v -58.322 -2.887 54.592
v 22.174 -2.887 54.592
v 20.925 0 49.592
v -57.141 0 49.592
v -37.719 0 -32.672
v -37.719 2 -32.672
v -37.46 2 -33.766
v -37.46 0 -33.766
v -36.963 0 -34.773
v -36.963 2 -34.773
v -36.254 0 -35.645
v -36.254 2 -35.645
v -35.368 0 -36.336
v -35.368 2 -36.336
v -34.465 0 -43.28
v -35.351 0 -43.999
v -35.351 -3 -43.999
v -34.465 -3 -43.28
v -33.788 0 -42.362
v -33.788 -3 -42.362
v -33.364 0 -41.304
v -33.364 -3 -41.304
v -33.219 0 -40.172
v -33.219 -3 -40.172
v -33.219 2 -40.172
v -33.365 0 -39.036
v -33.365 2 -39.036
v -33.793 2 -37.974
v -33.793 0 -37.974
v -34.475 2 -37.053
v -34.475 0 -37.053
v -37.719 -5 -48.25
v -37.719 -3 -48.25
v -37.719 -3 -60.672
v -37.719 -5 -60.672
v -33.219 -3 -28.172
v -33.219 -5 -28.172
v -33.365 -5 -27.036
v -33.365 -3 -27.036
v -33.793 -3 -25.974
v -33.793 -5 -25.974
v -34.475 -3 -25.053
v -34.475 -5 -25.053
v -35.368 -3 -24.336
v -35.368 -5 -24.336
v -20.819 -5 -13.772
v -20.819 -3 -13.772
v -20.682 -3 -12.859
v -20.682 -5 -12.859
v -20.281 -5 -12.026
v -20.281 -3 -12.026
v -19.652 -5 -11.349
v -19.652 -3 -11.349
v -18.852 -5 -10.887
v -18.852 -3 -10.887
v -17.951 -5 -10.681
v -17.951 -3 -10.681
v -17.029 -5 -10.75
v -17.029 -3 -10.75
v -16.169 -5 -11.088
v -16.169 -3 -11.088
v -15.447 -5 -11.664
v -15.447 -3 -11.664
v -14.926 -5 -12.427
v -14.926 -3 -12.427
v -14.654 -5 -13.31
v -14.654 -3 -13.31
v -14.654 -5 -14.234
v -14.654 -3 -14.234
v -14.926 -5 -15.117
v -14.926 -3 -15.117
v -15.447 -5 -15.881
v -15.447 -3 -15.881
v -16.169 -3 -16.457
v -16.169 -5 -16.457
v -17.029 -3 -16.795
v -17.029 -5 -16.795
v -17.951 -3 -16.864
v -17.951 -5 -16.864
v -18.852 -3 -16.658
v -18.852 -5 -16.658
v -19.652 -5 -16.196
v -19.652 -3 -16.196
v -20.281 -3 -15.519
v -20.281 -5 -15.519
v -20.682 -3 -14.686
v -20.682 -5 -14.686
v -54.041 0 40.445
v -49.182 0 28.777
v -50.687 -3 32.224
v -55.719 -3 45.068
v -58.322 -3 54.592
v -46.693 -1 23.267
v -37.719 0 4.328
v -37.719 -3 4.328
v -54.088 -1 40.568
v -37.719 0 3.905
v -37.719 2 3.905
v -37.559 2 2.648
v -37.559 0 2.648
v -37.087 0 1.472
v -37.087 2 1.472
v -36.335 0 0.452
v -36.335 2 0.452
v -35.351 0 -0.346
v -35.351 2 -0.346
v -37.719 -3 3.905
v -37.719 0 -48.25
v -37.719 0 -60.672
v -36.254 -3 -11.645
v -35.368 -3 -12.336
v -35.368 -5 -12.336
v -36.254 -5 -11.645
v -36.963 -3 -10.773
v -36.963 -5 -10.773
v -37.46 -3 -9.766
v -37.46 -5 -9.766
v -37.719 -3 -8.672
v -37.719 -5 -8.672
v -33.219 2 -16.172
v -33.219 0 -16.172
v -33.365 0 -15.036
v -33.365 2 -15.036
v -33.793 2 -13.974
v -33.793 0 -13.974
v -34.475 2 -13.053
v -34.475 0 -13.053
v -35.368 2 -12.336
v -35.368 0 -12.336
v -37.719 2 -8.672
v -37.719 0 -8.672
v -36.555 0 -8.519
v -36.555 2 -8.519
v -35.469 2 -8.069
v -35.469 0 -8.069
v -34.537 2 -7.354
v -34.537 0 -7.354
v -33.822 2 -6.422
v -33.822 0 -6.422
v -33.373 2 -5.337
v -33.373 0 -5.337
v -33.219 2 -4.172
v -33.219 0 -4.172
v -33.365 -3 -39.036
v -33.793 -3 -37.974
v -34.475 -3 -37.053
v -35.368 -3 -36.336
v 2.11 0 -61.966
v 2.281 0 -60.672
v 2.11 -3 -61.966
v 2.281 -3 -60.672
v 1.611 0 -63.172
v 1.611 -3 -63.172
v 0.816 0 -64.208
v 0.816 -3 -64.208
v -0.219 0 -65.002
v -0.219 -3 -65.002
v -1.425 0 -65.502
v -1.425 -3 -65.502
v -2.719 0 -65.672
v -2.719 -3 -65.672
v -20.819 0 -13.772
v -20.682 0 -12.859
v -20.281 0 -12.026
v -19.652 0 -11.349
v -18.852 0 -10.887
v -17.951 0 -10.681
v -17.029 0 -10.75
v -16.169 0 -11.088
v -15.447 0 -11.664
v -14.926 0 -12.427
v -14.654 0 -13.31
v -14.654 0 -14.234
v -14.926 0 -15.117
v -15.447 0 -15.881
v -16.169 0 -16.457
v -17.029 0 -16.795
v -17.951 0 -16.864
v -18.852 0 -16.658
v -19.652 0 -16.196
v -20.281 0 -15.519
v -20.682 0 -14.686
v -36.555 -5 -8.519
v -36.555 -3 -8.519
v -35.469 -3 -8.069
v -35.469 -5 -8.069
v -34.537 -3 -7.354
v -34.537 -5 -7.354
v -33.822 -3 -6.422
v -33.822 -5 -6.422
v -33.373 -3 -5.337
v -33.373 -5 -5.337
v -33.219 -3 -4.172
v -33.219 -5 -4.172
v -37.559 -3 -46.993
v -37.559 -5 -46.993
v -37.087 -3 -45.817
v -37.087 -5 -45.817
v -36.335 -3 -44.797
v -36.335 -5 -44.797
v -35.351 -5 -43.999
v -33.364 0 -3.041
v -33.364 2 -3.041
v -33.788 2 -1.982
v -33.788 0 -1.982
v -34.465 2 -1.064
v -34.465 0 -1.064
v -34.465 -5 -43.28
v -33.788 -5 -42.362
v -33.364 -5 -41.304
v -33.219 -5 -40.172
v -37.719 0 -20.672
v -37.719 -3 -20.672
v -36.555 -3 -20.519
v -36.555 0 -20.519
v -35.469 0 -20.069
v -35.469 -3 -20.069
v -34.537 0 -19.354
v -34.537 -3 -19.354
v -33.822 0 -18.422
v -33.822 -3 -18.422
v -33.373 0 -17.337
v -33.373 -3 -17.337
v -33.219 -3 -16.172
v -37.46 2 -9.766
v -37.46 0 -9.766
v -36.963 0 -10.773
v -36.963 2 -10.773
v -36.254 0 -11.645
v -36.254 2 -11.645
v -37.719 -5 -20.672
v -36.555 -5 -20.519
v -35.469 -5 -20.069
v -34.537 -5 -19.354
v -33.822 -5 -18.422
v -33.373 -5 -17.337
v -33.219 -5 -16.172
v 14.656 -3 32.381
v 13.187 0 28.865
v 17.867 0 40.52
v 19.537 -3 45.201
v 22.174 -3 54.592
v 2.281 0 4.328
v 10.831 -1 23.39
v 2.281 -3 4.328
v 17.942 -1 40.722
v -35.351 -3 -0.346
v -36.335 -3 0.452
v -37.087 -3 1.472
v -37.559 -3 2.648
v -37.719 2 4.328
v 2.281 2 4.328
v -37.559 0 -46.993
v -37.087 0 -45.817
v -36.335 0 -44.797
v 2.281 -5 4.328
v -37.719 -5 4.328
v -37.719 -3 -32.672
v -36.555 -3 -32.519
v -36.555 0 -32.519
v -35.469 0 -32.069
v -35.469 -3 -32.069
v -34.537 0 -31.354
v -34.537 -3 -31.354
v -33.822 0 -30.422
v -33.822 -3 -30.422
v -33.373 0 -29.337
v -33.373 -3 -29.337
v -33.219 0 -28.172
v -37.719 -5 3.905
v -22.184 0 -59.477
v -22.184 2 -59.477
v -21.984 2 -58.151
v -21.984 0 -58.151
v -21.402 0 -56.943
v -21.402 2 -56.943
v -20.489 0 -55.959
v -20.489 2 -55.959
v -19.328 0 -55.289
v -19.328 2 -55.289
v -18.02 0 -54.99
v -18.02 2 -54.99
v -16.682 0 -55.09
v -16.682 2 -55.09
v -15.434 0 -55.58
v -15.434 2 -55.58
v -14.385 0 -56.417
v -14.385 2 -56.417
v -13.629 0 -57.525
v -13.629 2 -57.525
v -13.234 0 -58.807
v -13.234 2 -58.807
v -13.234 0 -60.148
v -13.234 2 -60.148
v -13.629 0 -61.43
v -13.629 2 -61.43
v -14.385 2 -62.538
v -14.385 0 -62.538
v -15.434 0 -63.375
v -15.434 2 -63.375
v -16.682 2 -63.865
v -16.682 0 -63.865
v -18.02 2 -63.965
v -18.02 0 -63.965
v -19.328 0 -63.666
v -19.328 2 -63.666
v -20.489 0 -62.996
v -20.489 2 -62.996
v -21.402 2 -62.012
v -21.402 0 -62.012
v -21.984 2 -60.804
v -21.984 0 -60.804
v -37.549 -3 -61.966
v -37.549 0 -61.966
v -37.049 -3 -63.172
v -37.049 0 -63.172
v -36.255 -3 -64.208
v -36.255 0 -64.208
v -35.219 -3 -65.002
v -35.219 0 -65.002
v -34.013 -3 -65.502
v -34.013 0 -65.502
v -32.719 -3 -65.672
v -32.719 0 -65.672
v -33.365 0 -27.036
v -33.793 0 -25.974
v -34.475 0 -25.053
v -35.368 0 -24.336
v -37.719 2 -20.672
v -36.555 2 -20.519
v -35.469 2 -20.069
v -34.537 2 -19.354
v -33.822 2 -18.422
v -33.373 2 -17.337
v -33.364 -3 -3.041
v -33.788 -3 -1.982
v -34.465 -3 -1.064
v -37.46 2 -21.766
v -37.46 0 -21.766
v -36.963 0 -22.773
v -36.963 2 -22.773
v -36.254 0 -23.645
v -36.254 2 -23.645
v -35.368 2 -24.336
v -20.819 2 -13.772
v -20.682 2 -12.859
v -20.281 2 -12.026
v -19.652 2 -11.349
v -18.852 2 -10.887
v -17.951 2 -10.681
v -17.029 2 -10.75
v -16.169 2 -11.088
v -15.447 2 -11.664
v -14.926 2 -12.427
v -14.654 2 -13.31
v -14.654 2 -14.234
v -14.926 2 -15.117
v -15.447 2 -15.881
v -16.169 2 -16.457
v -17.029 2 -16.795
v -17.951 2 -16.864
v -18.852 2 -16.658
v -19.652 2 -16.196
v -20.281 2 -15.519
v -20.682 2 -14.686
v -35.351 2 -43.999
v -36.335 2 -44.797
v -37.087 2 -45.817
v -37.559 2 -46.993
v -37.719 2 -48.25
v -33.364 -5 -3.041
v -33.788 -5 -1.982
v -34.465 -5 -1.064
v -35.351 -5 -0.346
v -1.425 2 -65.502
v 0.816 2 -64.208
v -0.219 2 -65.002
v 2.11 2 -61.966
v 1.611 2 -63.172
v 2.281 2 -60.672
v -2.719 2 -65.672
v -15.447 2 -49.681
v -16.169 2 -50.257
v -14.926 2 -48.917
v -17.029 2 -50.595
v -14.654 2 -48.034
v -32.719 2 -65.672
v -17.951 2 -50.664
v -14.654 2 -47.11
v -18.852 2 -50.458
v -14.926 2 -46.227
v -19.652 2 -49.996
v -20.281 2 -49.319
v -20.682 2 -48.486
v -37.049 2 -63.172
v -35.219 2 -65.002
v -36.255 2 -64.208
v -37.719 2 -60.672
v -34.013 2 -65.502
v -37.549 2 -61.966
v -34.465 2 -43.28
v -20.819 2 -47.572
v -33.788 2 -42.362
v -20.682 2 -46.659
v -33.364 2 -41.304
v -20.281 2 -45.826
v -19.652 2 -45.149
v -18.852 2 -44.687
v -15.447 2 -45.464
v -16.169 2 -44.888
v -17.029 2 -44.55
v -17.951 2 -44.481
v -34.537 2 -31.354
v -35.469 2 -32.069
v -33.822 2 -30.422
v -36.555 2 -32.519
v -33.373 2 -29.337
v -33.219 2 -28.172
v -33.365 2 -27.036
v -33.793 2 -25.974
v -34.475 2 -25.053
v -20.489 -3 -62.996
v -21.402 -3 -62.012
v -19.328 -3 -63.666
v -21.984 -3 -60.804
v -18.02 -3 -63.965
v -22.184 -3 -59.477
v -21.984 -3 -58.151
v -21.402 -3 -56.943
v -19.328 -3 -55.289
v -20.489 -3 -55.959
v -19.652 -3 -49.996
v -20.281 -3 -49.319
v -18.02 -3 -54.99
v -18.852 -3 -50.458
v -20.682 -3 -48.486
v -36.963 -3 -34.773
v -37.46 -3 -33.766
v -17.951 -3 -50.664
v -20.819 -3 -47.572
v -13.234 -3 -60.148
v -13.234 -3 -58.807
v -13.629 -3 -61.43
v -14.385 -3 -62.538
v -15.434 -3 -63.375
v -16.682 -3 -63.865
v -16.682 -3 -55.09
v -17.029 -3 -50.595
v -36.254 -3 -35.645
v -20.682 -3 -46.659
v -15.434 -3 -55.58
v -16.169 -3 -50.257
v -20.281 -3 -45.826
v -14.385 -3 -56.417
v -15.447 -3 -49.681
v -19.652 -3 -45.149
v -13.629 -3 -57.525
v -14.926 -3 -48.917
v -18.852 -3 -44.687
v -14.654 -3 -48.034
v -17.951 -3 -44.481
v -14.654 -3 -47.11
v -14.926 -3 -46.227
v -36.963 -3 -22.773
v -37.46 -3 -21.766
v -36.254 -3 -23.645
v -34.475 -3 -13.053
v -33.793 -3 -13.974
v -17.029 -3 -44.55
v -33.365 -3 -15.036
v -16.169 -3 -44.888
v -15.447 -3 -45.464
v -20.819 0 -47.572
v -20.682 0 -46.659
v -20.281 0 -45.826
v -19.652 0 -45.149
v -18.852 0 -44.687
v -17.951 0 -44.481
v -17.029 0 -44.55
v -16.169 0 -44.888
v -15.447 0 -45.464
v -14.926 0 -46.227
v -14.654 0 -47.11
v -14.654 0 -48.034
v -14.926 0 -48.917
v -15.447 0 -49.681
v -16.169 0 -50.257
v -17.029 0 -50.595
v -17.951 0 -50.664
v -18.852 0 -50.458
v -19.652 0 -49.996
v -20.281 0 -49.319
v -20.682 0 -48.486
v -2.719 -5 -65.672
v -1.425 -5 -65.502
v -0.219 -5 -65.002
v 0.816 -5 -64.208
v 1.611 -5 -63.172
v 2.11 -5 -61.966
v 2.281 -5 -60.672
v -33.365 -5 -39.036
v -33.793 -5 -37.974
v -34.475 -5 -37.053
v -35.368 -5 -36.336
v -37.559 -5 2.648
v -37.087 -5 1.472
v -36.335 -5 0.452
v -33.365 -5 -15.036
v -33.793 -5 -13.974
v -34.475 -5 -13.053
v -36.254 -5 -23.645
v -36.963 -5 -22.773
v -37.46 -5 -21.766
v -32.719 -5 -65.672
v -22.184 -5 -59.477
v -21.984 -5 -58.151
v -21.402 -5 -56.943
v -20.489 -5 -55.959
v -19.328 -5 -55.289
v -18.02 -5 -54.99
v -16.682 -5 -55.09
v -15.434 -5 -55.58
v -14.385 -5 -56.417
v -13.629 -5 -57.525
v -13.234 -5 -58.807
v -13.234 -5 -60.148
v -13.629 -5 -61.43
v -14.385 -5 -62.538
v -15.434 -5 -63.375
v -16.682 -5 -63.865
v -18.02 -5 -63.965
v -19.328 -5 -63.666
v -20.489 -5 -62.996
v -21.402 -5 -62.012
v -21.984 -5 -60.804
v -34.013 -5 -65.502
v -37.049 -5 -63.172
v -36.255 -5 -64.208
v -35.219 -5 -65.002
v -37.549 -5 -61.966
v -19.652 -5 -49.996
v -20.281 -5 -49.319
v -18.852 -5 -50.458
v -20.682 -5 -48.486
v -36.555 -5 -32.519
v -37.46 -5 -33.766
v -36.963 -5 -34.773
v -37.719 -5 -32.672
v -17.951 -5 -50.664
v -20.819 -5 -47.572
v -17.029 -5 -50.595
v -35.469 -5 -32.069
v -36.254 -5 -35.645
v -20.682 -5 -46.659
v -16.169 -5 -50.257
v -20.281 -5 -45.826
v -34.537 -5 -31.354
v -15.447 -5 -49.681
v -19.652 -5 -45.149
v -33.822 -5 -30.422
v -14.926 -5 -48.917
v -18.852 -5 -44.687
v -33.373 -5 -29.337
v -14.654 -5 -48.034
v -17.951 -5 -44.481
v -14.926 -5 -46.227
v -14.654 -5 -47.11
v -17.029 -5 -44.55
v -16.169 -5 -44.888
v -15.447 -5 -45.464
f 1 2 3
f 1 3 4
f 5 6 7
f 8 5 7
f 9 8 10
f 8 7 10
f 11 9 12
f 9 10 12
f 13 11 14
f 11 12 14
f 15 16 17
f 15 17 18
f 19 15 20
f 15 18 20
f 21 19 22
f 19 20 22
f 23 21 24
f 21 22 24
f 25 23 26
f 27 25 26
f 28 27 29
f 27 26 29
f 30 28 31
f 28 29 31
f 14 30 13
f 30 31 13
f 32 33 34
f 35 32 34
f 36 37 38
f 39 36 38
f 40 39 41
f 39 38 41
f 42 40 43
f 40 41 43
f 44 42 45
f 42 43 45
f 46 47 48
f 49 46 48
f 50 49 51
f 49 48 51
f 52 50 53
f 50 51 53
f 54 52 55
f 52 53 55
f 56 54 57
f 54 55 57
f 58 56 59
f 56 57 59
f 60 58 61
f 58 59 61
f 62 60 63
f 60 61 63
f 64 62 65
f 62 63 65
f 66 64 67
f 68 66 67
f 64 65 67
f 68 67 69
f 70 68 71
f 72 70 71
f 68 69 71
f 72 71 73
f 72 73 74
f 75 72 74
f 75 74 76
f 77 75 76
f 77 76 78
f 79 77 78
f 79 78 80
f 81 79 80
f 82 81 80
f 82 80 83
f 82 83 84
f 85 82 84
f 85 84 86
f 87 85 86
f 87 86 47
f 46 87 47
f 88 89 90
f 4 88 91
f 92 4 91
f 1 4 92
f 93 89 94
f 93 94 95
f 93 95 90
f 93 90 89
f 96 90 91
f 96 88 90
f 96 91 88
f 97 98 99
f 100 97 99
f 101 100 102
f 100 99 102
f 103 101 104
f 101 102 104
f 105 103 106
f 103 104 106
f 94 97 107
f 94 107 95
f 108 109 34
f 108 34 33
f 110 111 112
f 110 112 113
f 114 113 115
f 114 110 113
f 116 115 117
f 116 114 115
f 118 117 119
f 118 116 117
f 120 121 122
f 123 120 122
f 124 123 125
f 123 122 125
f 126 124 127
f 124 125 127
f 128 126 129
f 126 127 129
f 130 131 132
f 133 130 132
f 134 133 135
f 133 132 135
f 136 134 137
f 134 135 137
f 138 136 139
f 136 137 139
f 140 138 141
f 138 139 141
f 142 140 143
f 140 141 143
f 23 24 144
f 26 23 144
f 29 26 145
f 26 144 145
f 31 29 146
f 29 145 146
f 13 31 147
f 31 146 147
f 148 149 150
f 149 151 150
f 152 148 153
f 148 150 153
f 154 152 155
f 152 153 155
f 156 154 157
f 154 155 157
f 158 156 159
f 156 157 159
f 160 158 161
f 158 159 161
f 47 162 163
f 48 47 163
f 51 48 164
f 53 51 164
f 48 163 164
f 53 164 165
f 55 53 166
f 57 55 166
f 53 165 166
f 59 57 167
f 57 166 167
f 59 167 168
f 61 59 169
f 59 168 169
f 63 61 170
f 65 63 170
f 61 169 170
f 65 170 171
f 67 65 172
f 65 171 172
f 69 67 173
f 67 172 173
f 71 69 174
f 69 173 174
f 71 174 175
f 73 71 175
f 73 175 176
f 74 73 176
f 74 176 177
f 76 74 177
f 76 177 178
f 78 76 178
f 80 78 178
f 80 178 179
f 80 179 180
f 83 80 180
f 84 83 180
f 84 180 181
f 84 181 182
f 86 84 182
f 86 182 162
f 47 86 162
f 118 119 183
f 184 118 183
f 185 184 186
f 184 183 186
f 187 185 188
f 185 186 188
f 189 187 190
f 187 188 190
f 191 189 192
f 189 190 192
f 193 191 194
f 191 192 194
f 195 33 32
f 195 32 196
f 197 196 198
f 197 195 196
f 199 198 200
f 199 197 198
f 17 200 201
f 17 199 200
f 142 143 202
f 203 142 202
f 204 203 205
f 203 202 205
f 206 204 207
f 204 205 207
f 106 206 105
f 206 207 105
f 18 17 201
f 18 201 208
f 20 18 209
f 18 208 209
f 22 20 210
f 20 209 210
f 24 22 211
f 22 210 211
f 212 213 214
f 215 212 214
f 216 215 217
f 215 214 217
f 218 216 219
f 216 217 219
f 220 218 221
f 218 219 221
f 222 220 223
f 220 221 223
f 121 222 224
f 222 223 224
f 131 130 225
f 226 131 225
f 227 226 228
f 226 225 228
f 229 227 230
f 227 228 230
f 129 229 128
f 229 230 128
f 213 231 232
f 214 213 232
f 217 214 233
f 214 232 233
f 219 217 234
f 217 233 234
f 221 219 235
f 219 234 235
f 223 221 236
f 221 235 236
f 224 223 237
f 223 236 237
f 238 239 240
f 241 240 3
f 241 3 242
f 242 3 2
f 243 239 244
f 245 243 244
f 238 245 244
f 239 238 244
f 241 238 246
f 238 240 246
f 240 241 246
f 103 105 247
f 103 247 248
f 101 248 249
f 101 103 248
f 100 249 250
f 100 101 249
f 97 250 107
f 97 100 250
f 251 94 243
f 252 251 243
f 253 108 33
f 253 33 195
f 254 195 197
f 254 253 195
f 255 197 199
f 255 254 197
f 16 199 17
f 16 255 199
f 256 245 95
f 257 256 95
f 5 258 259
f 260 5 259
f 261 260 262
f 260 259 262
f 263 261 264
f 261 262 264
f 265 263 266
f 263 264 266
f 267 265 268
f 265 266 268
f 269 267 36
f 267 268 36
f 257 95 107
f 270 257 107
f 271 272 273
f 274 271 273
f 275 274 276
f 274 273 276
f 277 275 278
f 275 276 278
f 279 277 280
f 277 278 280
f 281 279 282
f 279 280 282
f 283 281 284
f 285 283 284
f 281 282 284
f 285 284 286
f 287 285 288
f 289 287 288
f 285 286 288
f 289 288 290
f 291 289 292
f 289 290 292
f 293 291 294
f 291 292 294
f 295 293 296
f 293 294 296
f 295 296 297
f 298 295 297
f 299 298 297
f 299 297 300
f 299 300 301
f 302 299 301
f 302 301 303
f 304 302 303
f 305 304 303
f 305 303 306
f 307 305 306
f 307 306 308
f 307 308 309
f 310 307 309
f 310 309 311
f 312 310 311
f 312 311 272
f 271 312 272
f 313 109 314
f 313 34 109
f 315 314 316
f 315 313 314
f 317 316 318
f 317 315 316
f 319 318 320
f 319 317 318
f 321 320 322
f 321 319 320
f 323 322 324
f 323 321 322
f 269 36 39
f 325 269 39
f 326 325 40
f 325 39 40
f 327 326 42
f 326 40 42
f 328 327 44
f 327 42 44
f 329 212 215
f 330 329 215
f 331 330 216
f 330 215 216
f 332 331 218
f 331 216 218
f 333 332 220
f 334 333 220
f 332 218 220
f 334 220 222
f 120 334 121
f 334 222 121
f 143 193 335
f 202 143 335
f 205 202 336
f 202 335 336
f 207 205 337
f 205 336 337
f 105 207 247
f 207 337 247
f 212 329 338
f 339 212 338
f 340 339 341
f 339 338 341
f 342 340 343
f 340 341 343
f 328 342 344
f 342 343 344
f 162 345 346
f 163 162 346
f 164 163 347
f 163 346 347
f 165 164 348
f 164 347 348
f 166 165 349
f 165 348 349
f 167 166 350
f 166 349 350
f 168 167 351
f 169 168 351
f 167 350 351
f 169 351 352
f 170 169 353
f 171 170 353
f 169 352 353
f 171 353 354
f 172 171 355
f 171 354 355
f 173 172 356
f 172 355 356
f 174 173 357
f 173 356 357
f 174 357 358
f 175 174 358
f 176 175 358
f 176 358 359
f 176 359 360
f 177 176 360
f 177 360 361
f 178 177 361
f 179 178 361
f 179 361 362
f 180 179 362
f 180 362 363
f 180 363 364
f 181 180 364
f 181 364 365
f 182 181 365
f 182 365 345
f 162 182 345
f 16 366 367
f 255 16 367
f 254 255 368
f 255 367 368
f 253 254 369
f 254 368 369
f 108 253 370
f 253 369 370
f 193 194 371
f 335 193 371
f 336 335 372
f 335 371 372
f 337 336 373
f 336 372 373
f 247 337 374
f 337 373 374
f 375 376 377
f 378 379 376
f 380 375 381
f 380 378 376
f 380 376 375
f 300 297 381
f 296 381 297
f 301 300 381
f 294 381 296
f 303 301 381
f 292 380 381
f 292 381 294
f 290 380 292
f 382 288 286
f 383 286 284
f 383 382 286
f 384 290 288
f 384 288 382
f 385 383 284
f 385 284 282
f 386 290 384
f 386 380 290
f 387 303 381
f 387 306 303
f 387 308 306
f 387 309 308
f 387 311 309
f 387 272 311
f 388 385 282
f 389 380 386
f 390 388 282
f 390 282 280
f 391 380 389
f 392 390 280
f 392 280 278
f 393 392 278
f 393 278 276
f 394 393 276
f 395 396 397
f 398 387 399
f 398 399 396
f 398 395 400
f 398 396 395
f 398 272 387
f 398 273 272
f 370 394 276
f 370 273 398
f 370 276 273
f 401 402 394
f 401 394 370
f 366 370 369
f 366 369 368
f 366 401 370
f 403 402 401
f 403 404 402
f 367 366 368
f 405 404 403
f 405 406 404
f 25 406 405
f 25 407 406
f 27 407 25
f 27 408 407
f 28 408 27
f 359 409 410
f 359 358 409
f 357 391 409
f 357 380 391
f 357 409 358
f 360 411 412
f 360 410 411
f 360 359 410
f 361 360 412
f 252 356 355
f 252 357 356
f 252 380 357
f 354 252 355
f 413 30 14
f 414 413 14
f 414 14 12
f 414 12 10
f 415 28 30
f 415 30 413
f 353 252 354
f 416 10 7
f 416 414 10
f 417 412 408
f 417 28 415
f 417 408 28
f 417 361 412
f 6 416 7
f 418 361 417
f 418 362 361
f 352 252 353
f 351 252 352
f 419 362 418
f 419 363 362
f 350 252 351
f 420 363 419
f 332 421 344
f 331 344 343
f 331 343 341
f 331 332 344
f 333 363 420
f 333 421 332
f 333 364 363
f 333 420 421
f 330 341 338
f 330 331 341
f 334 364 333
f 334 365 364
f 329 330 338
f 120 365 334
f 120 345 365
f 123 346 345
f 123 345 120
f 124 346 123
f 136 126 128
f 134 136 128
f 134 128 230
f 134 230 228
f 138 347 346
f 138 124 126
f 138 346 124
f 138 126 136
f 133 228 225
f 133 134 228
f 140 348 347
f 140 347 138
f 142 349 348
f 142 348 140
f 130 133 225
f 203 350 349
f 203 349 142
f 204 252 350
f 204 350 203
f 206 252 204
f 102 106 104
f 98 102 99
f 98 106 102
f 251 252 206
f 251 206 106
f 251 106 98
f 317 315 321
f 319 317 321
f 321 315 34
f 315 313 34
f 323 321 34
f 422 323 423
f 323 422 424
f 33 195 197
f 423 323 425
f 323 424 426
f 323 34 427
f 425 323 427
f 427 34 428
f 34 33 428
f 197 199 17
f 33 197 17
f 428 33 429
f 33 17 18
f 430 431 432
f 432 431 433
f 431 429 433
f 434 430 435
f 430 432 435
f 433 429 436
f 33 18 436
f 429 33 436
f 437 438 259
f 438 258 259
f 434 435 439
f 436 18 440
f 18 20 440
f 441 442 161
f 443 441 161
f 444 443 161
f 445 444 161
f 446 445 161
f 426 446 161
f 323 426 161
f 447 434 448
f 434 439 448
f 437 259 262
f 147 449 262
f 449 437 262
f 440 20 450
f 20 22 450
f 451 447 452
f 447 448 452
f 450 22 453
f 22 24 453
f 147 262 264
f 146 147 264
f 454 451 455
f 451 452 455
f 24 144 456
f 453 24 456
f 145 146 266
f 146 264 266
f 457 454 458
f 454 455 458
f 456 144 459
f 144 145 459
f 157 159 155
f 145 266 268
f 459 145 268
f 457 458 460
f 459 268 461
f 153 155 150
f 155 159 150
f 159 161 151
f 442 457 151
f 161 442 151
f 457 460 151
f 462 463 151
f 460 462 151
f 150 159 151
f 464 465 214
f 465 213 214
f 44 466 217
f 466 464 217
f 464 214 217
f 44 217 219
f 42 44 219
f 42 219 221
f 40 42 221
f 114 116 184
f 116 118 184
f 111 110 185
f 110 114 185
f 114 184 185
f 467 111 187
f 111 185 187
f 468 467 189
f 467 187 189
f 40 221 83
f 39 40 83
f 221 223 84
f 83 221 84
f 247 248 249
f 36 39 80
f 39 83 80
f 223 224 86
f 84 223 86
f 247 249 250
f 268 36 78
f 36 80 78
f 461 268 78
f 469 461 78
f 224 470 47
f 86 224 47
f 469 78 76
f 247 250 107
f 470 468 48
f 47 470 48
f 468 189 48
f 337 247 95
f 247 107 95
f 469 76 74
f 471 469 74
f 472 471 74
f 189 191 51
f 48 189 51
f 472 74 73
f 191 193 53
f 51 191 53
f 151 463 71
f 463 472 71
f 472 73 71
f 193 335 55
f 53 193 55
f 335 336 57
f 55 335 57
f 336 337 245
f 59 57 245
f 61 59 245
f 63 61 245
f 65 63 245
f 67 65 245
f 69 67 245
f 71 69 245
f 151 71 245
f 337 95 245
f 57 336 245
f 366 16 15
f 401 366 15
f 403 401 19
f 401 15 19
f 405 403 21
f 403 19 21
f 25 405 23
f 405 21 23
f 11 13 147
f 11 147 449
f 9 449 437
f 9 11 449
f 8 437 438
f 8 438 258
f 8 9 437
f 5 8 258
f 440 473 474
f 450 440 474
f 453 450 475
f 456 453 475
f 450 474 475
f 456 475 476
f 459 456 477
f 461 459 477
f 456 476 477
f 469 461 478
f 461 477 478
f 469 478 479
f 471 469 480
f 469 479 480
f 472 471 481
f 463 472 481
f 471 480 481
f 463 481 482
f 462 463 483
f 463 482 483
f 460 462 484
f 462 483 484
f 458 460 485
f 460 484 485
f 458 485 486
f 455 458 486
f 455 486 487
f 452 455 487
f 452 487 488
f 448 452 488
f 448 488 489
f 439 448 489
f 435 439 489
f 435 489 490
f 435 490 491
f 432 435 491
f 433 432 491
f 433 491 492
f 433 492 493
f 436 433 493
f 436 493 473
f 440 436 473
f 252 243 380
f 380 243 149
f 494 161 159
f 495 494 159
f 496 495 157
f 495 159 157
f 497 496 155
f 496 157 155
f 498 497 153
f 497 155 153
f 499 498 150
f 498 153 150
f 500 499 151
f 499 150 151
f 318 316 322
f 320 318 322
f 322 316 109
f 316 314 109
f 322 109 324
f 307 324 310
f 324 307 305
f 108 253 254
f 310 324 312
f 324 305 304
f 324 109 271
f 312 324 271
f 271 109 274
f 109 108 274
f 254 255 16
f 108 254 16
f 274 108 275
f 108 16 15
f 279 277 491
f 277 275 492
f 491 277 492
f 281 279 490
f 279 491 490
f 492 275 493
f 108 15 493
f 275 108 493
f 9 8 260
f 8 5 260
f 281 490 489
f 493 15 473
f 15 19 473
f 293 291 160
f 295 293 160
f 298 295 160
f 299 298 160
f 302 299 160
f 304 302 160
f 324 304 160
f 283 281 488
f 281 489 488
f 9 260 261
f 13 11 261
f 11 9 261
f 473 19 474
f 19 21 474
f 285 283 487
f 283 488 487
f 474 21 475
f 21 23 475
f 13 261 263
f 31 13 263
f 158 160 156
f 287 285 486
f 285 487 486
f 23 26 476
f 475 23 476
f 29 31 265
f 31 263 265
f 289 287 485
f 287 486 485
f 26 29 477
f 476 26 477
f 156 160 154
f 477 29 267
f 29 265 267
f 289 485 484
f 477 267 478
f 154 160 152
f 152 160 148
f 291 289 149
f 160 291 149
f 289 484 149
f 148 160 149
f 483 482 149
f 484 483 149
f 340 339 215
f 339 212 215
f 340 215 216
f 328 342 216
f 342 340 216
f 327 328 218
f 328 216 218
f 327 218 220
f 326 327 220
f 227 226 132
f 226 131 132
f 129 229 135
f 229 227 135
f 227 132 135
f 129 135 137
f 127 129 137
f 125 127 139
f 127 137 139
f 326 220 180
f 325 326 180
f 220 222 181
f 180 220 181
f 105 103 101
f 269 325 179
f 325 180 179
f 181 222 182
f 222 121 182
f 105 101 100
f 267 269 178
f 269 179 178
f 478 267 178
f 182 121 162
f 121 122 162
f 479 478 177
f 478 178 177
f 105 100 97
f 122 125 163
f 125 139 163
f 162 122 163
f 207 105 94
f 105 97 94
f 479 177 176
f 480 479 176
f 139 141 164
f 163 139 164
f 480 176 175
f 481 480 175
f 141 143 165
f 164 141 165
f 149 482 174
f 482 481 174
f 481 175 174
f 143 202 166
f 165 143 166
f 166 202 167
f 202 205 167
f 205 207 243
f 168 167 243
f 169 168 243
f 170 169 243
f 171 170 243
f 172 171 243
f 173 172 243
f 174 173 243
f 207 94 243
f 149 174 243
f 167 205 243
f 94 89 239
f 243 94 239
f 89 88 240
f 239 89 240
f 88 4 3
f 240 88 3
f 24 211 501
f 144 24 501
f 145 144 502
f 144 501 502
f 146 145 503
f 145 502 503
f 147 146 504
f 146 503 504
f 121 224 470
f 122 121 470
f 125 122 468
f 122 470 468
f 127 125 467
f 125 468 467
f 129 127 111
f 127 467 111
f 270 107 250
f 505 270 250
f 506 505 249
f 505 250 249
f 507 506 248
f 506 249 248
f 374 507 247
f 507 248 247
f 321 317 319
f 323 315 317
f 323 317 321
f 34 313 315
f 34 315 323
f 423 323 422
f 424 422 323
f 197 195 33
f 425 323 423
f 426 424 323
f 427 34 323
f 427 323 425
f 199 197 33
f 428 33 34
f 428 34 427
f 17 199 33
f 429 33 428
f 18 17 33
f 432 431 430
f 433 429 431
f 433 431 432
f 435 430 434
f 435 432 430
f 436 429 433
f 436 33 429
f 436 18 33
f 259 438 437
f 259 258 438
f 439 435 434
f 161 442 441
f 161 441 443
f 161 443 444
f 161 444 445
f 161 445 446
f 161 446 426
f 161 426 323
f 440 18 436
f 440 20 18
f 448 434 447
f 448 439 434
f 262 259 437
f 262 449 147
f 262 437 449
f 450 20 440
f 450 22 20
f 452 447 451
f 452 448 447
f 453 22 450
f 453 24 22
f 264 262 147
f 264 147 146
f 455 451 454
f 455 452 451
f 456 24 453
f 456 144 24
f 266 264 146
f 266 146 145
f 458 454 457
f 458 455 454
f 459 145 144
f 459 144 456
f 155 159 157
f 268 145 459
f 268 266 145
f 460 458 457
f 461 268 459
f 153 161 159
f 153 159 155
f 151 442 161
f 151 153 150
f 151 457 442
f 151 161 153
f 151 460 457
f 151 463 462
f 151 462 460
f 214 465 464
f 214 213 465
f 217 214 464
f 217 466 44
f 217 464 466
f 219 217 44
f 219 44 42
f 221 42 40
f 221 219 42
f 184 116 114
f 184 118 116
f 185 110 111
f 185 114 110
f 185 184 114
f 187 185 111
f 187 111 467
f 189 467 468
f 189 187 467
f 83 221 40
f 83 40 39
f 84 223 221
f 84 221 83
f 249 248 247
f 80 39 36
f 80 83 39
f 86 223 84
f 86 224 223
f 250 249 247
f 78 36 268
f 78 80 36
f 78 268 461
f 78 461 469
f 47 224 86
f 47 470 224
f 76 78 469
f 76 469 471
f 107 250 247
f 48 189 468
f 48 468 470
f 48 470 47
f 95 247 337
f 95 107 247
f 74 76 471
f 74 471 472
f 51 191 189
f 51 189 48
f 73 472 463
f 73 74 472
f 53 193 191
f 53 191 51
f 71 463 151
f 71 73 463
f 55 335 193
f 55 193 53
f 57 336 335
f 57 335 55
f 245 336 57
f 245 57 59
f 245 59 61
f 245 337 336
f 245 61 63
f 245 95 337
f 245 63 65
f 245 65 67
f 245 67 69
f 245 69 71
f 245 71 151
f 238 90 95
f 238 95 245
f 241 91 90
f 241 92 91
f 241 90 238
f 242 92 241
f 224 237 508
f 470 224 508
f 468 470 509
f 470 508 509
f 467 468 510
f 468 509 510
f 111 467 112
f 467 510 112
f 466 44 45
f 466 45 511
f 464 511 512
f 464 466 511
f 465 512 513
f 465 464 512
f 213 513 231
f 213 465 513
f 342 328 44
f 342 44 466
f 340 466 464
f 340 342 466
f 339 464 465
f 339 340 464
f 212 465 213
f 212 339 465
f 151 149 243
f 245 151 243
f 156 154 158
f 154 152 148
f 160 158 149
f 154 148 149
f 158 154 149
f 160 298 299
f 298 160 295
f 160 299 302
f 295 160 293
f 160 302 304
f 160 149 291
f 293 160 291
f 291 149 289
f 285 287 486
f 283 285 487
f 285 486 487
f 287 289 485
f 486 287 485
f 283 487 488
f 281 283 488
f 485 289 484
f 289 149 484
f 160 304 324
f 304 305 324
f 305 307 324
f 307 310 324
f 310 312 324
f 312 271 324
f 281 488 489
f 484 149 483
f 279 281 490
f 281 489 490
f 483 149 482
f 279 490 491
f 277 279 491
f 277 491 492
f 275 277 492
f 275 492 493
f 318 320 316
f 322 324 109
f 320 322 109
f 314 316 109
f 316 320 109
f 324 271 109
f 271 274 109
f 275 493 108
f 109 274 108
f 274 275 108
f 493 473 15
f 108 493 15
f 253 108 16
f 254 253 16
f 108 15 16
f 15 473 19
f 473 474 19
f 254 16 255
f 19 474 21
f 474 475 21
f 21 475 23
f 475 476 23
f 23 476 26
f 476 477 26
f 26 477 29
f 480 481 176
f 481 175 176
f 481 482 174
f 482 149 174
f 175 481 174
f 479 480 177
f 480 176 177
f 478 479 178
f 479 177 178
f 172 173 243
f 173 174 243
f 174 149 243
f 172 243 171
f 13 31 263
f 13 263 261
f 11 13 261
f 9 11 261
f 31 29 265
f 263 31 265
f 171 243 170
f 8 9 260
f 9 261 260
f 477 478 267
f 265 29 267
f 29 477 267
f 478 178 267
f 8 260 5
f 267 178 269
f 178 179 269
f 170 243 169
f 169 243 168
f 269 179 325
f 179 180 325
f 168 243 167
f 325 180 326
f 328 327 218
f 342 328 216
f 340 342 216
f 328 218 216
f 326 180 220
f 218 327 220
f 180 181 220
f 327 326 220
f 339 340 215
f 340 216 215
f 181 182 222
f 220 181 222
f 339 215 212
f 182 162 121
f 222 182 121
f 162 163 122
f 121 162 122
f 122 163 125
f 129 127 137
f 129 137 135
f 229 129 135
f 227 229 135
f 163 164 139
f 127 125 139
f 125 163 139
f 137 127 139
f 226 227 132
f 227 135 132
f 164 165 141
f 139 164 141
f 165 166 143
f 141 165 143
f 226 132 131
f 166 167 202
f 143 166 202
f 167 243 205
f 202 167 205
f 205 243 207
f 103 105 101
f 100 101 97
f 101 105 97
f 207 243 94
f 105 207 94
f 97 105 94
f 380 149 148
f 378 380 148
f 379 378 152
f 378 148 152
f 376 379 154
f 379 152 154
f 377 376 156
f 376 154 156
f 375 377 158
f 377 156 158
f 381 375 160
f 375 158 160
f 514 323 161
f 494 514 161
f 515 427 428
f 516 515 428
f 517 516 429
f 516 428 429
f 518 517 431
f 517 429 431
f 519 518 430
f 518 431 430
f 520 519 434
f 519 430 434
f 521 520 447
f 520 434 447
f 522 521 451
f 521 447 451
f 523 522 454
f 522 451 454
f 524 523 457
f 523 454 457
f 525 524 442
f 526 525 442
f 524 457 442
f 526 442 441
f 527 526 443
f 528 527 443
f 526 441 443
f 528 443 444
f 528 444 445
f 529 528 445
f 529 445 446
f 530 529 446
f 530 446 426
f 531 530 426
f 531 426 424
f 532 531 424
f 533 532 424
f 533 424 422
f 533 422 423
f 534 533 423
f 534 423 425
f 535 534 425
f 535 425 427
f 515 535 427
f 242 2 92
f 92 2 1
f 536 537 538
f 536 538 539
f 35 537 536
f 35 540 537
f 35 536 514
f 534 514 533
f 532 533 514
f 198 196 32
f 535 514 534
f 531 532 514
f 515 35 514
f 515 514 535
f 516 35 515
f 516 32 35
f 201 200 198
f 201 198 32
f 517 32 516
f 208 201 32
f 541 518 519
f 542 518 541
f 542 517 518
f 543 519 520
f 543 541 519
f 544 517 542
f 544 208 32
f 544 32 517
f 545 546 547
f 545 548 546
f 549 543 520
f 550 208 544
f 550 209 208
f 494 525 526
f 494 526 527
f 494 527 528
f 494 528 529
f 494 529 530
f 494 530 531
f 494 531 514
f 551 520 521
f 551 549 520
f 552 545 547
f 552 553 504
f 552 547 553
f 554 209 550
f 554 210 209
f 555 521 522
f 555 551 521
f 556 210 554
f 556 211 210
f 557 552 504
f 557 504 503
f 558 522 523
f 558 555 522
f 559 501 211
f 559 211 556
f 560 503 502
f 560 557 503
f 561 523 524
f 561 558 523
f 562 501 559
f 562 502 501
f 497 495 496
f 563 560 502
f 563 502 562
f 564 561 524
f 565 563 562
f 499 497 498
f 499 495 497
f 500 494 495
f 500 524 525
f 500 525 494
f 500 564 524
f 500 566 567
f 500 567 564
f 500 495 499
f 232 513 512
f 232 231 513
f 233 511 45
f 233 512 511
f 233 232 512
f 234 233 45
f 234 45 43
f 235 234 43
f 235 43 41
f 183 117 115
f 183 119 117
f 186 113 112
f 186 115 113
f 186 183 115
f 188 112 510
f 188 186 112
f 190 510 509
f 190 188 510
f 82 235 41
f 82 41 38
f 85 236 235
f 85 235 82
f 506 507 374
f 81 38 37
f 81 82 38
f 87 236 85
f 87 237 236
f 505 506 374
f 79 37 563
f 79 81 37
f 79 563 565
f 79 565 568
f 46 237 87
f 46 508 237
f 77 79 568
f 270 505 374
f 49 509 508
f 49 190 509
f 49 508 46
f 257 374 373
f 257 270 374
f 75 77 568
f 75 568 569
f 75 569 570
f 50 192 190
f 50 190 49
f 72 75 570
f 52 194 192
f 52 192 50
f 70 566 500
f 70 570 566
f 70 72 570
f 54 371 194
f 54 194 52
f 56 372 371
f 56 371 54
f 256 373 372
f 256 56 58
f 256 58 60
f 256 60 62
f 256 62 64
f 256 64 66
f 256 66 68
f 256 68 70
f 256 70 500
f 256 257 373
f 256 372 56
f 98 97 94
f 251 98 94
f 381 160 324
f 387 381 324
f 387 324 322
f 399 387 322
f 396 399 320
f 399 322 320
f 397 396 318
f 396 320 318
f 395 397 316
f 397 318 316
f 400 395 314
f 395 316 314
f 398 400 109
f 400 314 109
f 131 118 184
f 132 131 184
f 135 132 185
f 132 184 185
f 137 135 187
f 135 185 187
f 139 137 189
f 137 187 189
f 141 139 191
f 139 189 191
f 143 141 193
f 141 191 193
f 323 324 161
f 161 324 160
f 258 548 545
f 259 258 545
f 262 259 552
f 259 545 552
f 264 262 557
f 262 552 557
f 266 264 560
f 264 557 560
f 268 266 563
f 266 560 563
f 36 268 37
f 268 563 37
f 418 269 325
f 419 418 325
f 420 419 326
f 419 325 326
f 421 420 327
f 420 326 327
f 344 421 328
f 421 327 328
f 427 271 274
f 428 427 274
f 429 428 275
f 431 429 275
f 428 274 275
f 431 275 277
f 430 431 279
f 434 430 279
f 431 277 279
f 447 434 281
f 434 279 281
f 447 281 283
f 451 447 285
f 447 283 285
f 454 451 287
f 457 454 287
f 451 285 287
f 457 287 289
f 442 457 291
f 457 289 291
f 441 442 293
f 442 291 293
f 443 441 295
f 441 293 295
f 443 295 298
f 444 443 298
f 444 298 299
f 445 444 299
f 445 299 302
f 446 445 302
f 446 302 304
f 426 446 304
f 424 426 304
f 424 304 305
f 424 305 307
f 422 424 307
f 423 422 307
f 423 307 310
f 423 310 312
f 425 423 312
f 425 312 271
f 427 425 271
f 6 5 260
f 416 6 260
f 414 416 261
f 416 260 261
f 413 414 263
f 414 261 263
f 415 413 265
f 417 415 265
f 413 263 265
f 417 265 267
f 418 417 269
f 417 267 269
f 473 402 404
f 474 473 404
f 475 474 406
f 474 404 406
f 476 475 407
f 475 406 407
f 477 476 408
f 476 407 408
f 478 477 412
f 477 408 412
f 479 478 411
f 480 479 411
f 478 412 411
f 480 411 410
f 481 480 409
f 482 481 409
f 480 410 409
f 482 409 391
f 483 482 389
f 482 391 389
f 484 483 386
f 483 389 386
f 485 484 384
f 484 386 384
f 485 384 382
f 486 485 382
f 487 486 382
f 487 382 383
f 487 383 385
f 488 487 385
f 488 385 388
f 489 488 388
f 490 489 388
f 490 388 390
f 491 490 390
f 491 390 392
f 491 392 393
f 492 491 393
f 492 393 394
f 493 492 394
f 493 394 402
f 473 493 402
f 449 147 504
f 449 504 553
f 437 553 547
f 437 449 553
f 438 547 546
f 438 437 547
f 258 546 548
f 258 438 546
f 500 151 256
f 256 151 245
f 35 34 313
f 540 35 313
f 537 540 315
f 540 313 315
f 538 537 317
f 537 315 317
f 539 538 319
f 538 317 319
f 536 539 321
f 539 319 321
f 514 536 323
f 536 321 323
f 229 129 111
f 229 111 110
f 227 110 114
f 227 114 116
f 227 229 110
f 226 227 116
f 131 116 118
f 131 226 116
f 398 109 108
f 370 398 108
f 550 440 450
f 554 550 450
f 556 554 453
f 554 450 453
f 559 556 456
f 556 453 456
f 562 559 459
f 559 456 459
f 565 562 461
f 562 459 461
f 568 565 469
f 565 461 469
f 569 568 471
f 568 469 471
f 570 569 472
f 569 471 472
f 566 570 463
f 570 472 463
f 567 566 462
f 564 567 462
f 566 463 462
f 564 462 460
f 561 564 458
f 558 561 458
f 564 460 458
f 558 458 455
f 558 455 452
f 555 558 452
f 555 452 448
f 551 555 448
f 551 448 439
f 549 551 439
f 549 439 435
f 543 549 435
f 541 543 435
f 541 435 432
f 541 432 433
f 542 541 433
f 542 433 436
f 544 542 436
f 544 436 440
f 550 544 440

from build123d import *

# Parameters (mm, degrees)
F0_W           = 40
F0_H           = 70
F1_DEPTH       = 3
F2_SIZE2       = 2.8867513459
F2_SIZE        = 5
F3_R           = 5
F5_DEPTH       = 2
F7_DEPTH       = 2
F9_DEPTH       = 25
F10_T1_DEPTH   = 20.8887360535
F10_T3_DEPTH   = 18
F10_2_T1_DEPTH = 19.8887360535
F10_2_T3_DEPTH = 17
F10_3_T1_DEPTH = 19.8887360535
F10_3_T3_DEPTH = 17
F11_R          = 3.1
F12_DEPTH      = 25
F13_R          = 4.5
F14_DEPTH      = 25


# Not quite as in the source:
# - a fillet or chamfer that OpenCascade refuses, or shapes differently, is made with other operations: its cross-section is extruded or revolved along the edge and cut away or added


with BuildPart() as f1:
    # F0 (on Front) → F1 (new body)
    with BuildSketch(Plane.XZ):
        with Locations((-17.71930933, -30.67235291)):
            Rectangle(F0_W, F0_H)
        with BuildLine():
            add(Edge.make_bspline(
                [(-37.71930933, 4.32764709), (-46.9567519014, 23.5397209268), (-56.1941944728, 42.7517947636), (-58.3224408329, 54.5924380422)],
                knots=[0, 0, 0, 0, 0.660266098, 0.660266098, 0.660266098, 0.660266098], degree=3))
            Line((-37.71930933, 4.32764709), (2.28069067, 4.32764709))
            add(Edge.make_bspline(
                [(2.28069067, 4.32764709), (11.0710881678, 23.6786254545), (19.8614856657, 43.029603819), (22.1735145897, 54.5924380422)],
                knots=[0, 0, 0, 0, 0.6674614582, 0.6674614582, 0.6674614582, 0.6674614582], degree=3))
            Line((22.1735145897, 54.5924380422), (-58.3224408329, 54.5924380422))
        make_face()
    extrude(amount=F1_DEPTH)

    # F2
    f2_edges = [f1.edges().sort_by_distance(p)[0] for p in [
        (-18.074463, 0, 54.592438),
    ]]
    f2_side = f1.faces().sort_by_distance((-17.870768, 0, 2.51511))[0]
    chamfer(f2_edges, length=F2_SIZE, length2=F2_SIZE2, reference=f2_side)

    # F3
    f3_edges = [f1.edges().sort_by_distance(p)[0] for p in [
        (2.280691, -1.5, -65.672353),
        (-37.719309, -1.5, -65.672353),
    ]]
    fillet(f3_edges, radius=F3_R)


with BuildPart() as f5:
    # F4 (on face) → F5 (new body)
    with BuildSketch(Plane.XZ.offset(3)):
        with BuildLine():
            Line((2.28069067, 4.32764709), (-37.71930933, 4.32764709))
            Line((-37.71930933, 4.32764709), (-37.71930933, -60.67235291))
            ThreePointArc((-37.71930933, -60.67235291), (-36.2548432359, -64.207886816), (-32.71930933, -65.67235291))
            Line((-32.71930933, -65.67235291), (-2.71930933, -65.67235291))
            ThreePointArc((-2.71930933, -65.67235291), (0.8162245759, -64.207886816), (2.28069067, -60.67235291))
            Line((2.28069067, -60.67235291), (2.28069067, 4.32764709))
        make_face()
    extrude(amount=F5_DEPTH)


with BuildPart() as f7:
    # F6 (on face) → F7 (new body)
    with BuildSketch(Plane(origin=(0, 0, 0), x_dir=(-1, 0, 0), z_dir=(0, 1, 0))):
        with BuildLine():
            Line((37.71930933, 4.32764709), (-2.28069067, 4.32764709))
            Line((-2.28069067, 4.32764709), (-2.28069067, -60.67235291))
            ThreePointArc((-2.28069067, -60.67235291), (-0.8162245759, -64.207886816), (2.71930933, -65.67235291))
            Line((2.71930933, -65.67235291), (32.71930933, -65.67235291))
            ThreePointArc((32.71930933, -65.67235291), (36.2548432359, -64.207886816), (37.71930933, -60.67235291))
            Line((37.71930933, -60.67235291), (37.71930933, 4.32764709))
        make_face()
    extrude(amount=F7_DEPTH)


with BuildPart() as f9_tool:
    # F8 (on face) → F9 (new body)
    with BuildSketch(Plane.XZ.offset(5)):
        with BuildLine():
            ThreePointArc((-37.71930933, -8.67235291), (-34.5373288146, -7.3543334254), (-33.21930933, -4.17235291))
            ThreePointArc((-33.21930933, -4.17235291), (-34.5373288146, -0.9903723947), (-37.71930933, 0.32764709))
            Line((-37.71930933, 0.32764709), (-37.71930933, -8.67235291))
        make_face()
        with BuildLine():
            ThreePointArc((-33.21930933, -16.17235291), (-34.5373288146, -12.9903723947), (-37.71930933, -11.67235291))
            Line((-37.71930933, -11.67235291), (-37.71930933, -20.67235291))
            ThreePointArc((-37.71930933, -20.67235291), (-34.5373288146, -19.3543334254), (-33.21930933, -16.17235291))
        make_face()
        with BuildLine():
            ThreePointArc((-33.21930933, -28.17235291), (-34.5373288146, -24.9903723947), (-37.71930933, -23.67235291))
            Line((-37.71930933, -23.67235291), (-37.71930933, -32.67235291))
            ThreePointArc((-37.71930933, -32.67235291), (-34.5373288146, -31.3543334254), (-33.21930933, -28.17235291))
        make_face()
        with BuildLine():
            ThreePointArc((-33.21930933, -40.17235291), (-34.5373288146, -36.9903723947), (-37.71930933, -35.67235291))
            Line((-37.71930933, -35.67235291), (-37.71930933, -44.67235291))
            ThreePointArc((-37.71930933, -44.67235291), (-34.5373288146, -43.3543334254), (-33.21930933, -40.17235291))
        make_face()
    extrude(amount=-F9_DEPTH)


with BuildPart() as f1_1:
    add(f1.part)

    # F9: cut by f9_tool
    add(f9_tool.part, mode=Mode.SUBTRACT)

    # F10: fillet of radius 5 on 5 edges, made by hand

    # F10_s2 → F10_t1 (cut)
    with BuildSketch(Plane.XZ.offset(-8.9443680268)):
        with BuildLine():
            ThreePointArc((-35.3508882774, -0.3460515997), (-37.0872547702, 1.4720729837), (-37.71930933, 3.9053943007))
            Line((-37.71930933, 3.9053943007), (-37.71930933, 0.32764709))
            ThreePointArc((-37.71930933, 0.32764709), (-36.4881220771, 0.1559467501), (-35.3508882774, -0.3460515997))
        make_face()
        with BuildLine():
            ThreePointArc((-37.71930933, -48.2501001207), (-37.0872547702, -45.8167788038), (-35.3508882774, -43.9986542204))
            ThreePointArc((-35.3508882774, -43.9986542204), (-36.4881220771, -44.5006525702), (-37.71930933, -44.67235291))
            Line((-37.71930933, -44.67235291), (-37.71930933, -48.2501001207))
        make_face()
    extrude(amount=F10_T1_DEPTH, mode=Mode.SUBTRACT)

    # F10_s4 → F10_t3 (cut)
    with BuildSketch(Plane.XZ.offset(-7.5)):
        with BuildLine():
            ThreePointArc((-35.3680027444, -12.3355108048), (-36.9632021222, -10.7732299606), (-37.71930933, -8.67235291))
            Line((-37.71930933, -8.67235291), (-37.71930933, -11.67235291))
            ThreePointArc((-37.71930933, -11.67235291), (-36.4977917234, -11.8413143814), (-35.3680027444, -12.3355108048))
        make_face()
        with BuildLine():
            ThreePointArc((-35.3680027444, -24.3355108048), (-36.9632021222, -22.7732299606), (-37.71930933, -20.67235291))
            Line((-37.71930933, -20.67235291), (-37.71930933, -23.67235291))
            ThreePointArc((-37.71930933, -23.67235291), (-36.4977917234, -23.8413143814), (-35.3680027444, -24.3355108048))
        make_face()
        with BuildLine():
            ThreePointArc((-35.3680027444, -36.3355108048), (-36.9632021222, -34.7732299606), (-37.71930933, -32.67235291))
            Line((-37.71930933, -32.67235291), (-37.71930933, -35.67235291))
            ThreePointArc((-37.71930933, -35.67235291), (-36.4977917234, -35.8413143814), (-35.3680027444, -36.3355108048))
        make_face()
    extrude(amount=F10_T3_DEPTH, mode=Mode.SUBTRACT)


with BuildPart() as f5_1:
    add(f5.part)

    # F9: cut by f9_tool
    add(f9_tool.part, mode=Mode.SUBTRACT)

    # F10#2: fillet of radius 5 on 5 edges, made by hand

    # F10_2_s2 → F10_2_t1 (cut)
    with BuildSketch(Plane.XZ.offset(-5.9443680268)):
        with BuildLine():
            ThreePointArc((-37.71930933, 3.9053943007), (-37.0872547702, 1.4720729837), (-35.3508882774, -0.3460515997))
            ThreePointArc((-35.3508882774, -0.3460515997), (-36.4881220771, 0.1559467501), (-37.71930933, 0.32764709))
            Line((-37.71930933, 0.32764709), (-37.71930933, 3.9053943007))
        make_face()
        with BuildLine():
            ThreePointArc((-37.71930933, -48.2501001207), (-37.0872547702, -45.8167788038), (-35.3508882774, -43.9986542204))
            ThreePointArc((-35.3508882774, -43.9986542204), (-36.4881220771, -44.5006525702), (-37.71930933, -44.67235291))
            Line((-37.71930933, -44.67235291), (-37.71930933, -48.2501001207))
        make_face()
    extrude(amount=F10_2_T1_DEPTH, mode=Mode.SUBTRACT)

    # F10_2_s4 → F10_2_t3 (cut)
    with BuildSketch(Plane.XZ.offset(-4.5)):
        with BuildLine():
            ThreePointArc((-35.3680027444, -12.3355108048), (-36.9632021222, -10.7732299606), (-37.71930933, -8.67235291))
            Line((-37.71930933, -8.67235291), (-37.71930933, -11.67235291))
            ThreePointArc((-37.71930933, -11.67235291), (-36.4977917234, -11.8413143814), (-35.3680027444, -12.3355108048))
        make_face()
        with BuildLine():
            ThreePointArc((-35.3680027444, -24.3355108048), (-36.9632021222, -22.7732299606), (-37.71930933, -20.67235291))
            Line((-37.71930933, -20.67235291), (-37.71930933, -23.67235291))
            ThreePointArc((-37.71930933, -23.67235291), (-36.4977917234, -23.8413143814), (-35.3680027444, -24.3355108048))
        make_face()
        with BuildLine():
            ThreePointArc((-35.3680027444, -36.3355108048), (-36.9632021222, -34.7732299606), (-37.71930933, -32.67235291))
            Line((-37.71930933, -32.67235291), (-37.71930933, -35.67235291))
            ThreePointArc((-37.71930933, -35.67235291), (-36.4977917234, -35.8413143814), (-35.3680027444, -36.3355108048))
        make_face()
    extrude(amount=F10_2_T3_DEPTH, mode=Mode.SUBTRACT)


with BuildPart() as f7_1:
    add(f7.part)

    # F9: cut by f9_tool
    add(f9_tool.part, mode=Mode.SUBTRACT)

    # F10#3: fillet of radius 5 on 5 edges, made by hand

    # F10_3_s2 → F10_3_t1 (cut)
    with BuildSketch(Plane.XZ.offset(-10.9443680268)):
        with BuildLine():
            ThreePointArc((-37.71930933, 3.9053943007), (-37.0872547702, 1.4720729837), (-35.3508882774, -0.3460515997))
            ThreePointArc((-35.3508882774, -0.3460515997), (-36.4881220771, 0.1559467501), (-37.71930933, 0.32764709))
            Line((-37.71930933, 0.32764709), (-37.71930933, 3.9053943007))
        make_face()
        with BuildLine():
            ThreePointArc((-35.3508882774, -43.9986542204), (-37.0872547702, -45.8167788038), (-37.71930933, -48.2501001207))
            Line((-37.71930933, -48.2501001207), (-37.71930933, -44.67235291))
            ThreePointArc((-37.71930933, -44.67235291), (-36.4881220771, -44.5006525702), (-35.3508882774, -43.9986542204))
        make_face()
    extrude(amount=F10_3_T1_DEPTH, mode=Mode.SUBTRACT)

    # F10_3_s4 → F10_3_t3 (cut)
    with BuildSketch(Plane.XZ.offset(-9.5)):
        with BuildLine():
            ThreePointArc((-37.71930933, -8.67235291), (-36.9632021222, -10.7732299606), (-35.3680027444, -12.3355108048))
            ThreePointArc((-35.3680027444, -12.3355108048), (-36.4977917234, -11.8413143814), (-37.71930933, -11.67235291))
            Line((-37.71930933, -11.67235291), (-37.71930933, -8.67235291))
        make_face()
        with BuildLine():
            ThreePointArc((-37.71930933, -20.67235291), (-36.9632021222, -22.7732299606), (-35.3680027444, -24.3355108048))
            ThreePointArc((-35.3680027444, -24.3355108048), (-36.4977917234, -23.8413143814), (-37.71930933, -23.67235291))
            Line((-37.71930933, -23.67235291), (-37.71930933, -20.67235291))
        make_face()
        with BuildLine():
            ThreePointArc((-37.71930933, -32.67235291), (-36.9632021222, -34.7732299606), (-35.3680027444, -36.3355108048))
            ThreePointArc((-35.3680027444, -36.3355108048), (-36.4977917234, -35.8413143814), (-37.71930933, -35.67235291))
            Line((-37.71930933, -35.67235291), (-37.71930933, -32.67235291))
        make_face()
    extrude(amount=F10_3_T3_DEPTH, mode=Mode.SUBTRACT)


with BuildPart() as f12_tool:
    # F11 (on face) → F12 (new body)
    with BuildSketch(Plane(origin=(0, 2, 0), x_dir=(-1, 0, 0), z_dir=(0, 1, 0))):
        with Locations((17.71930933, -13.77235291)):
            Circle(F11_R)
        with Locations((17.71930933, -47.57235291)):
            Circle(F11_R)
    extrude(amount=-F12_DEPTH)


with BuildPart() as f1_2:
    add(f1_1.part)

    # F12: cut by f12_tool
    add(f12_tool.part, mode=Mode.SUBTRACT)


with BuildPart() as f5_2:
    add(f5_1.part)

    # F12: cut by f12_tool
    add(f12_tool.part, mode=Mode.SUBTRACT)


with BuildPart() as f7_2:
    add(f7_1.part)

    # F12: cut by f12_tool
    add(f12_tool.part, mode=Mode.SUBTRACT)


with BuildPart() as f14_tool:
    # F13 (on face) → F14 (new body)
    with BuildSketch(Plane(origin=(0, 2, 0), x_dir=(-1, 0, 0), z_dir=(0, 1, 0))):
        with Locations((17.6835853607, -59.4774961946)):
            Circle(F13_R)
    extrude(amount=-F14_DEPTH)


with BuildPart() as f1_3:
    add(f1_2.part)

    # F14: cut by f14_tool
    add(f14_tool.part, mode=Mode.SUBTRACT)


with BuildPart() as f5_3:
    add(f5_2.part)

    # F14: cut by f14_tool
    add(f14_tool.part, mode=Mode.SUBTRACT)


with BuildPart() as f7_3:
    add(f7_2.part)

    # F14: cut by f14_tool
    add(f14_tool.part, mode=Mode.SUBTRACT)


solid = Compound([f1_3.part, f5_3.part, f7_3.part])
